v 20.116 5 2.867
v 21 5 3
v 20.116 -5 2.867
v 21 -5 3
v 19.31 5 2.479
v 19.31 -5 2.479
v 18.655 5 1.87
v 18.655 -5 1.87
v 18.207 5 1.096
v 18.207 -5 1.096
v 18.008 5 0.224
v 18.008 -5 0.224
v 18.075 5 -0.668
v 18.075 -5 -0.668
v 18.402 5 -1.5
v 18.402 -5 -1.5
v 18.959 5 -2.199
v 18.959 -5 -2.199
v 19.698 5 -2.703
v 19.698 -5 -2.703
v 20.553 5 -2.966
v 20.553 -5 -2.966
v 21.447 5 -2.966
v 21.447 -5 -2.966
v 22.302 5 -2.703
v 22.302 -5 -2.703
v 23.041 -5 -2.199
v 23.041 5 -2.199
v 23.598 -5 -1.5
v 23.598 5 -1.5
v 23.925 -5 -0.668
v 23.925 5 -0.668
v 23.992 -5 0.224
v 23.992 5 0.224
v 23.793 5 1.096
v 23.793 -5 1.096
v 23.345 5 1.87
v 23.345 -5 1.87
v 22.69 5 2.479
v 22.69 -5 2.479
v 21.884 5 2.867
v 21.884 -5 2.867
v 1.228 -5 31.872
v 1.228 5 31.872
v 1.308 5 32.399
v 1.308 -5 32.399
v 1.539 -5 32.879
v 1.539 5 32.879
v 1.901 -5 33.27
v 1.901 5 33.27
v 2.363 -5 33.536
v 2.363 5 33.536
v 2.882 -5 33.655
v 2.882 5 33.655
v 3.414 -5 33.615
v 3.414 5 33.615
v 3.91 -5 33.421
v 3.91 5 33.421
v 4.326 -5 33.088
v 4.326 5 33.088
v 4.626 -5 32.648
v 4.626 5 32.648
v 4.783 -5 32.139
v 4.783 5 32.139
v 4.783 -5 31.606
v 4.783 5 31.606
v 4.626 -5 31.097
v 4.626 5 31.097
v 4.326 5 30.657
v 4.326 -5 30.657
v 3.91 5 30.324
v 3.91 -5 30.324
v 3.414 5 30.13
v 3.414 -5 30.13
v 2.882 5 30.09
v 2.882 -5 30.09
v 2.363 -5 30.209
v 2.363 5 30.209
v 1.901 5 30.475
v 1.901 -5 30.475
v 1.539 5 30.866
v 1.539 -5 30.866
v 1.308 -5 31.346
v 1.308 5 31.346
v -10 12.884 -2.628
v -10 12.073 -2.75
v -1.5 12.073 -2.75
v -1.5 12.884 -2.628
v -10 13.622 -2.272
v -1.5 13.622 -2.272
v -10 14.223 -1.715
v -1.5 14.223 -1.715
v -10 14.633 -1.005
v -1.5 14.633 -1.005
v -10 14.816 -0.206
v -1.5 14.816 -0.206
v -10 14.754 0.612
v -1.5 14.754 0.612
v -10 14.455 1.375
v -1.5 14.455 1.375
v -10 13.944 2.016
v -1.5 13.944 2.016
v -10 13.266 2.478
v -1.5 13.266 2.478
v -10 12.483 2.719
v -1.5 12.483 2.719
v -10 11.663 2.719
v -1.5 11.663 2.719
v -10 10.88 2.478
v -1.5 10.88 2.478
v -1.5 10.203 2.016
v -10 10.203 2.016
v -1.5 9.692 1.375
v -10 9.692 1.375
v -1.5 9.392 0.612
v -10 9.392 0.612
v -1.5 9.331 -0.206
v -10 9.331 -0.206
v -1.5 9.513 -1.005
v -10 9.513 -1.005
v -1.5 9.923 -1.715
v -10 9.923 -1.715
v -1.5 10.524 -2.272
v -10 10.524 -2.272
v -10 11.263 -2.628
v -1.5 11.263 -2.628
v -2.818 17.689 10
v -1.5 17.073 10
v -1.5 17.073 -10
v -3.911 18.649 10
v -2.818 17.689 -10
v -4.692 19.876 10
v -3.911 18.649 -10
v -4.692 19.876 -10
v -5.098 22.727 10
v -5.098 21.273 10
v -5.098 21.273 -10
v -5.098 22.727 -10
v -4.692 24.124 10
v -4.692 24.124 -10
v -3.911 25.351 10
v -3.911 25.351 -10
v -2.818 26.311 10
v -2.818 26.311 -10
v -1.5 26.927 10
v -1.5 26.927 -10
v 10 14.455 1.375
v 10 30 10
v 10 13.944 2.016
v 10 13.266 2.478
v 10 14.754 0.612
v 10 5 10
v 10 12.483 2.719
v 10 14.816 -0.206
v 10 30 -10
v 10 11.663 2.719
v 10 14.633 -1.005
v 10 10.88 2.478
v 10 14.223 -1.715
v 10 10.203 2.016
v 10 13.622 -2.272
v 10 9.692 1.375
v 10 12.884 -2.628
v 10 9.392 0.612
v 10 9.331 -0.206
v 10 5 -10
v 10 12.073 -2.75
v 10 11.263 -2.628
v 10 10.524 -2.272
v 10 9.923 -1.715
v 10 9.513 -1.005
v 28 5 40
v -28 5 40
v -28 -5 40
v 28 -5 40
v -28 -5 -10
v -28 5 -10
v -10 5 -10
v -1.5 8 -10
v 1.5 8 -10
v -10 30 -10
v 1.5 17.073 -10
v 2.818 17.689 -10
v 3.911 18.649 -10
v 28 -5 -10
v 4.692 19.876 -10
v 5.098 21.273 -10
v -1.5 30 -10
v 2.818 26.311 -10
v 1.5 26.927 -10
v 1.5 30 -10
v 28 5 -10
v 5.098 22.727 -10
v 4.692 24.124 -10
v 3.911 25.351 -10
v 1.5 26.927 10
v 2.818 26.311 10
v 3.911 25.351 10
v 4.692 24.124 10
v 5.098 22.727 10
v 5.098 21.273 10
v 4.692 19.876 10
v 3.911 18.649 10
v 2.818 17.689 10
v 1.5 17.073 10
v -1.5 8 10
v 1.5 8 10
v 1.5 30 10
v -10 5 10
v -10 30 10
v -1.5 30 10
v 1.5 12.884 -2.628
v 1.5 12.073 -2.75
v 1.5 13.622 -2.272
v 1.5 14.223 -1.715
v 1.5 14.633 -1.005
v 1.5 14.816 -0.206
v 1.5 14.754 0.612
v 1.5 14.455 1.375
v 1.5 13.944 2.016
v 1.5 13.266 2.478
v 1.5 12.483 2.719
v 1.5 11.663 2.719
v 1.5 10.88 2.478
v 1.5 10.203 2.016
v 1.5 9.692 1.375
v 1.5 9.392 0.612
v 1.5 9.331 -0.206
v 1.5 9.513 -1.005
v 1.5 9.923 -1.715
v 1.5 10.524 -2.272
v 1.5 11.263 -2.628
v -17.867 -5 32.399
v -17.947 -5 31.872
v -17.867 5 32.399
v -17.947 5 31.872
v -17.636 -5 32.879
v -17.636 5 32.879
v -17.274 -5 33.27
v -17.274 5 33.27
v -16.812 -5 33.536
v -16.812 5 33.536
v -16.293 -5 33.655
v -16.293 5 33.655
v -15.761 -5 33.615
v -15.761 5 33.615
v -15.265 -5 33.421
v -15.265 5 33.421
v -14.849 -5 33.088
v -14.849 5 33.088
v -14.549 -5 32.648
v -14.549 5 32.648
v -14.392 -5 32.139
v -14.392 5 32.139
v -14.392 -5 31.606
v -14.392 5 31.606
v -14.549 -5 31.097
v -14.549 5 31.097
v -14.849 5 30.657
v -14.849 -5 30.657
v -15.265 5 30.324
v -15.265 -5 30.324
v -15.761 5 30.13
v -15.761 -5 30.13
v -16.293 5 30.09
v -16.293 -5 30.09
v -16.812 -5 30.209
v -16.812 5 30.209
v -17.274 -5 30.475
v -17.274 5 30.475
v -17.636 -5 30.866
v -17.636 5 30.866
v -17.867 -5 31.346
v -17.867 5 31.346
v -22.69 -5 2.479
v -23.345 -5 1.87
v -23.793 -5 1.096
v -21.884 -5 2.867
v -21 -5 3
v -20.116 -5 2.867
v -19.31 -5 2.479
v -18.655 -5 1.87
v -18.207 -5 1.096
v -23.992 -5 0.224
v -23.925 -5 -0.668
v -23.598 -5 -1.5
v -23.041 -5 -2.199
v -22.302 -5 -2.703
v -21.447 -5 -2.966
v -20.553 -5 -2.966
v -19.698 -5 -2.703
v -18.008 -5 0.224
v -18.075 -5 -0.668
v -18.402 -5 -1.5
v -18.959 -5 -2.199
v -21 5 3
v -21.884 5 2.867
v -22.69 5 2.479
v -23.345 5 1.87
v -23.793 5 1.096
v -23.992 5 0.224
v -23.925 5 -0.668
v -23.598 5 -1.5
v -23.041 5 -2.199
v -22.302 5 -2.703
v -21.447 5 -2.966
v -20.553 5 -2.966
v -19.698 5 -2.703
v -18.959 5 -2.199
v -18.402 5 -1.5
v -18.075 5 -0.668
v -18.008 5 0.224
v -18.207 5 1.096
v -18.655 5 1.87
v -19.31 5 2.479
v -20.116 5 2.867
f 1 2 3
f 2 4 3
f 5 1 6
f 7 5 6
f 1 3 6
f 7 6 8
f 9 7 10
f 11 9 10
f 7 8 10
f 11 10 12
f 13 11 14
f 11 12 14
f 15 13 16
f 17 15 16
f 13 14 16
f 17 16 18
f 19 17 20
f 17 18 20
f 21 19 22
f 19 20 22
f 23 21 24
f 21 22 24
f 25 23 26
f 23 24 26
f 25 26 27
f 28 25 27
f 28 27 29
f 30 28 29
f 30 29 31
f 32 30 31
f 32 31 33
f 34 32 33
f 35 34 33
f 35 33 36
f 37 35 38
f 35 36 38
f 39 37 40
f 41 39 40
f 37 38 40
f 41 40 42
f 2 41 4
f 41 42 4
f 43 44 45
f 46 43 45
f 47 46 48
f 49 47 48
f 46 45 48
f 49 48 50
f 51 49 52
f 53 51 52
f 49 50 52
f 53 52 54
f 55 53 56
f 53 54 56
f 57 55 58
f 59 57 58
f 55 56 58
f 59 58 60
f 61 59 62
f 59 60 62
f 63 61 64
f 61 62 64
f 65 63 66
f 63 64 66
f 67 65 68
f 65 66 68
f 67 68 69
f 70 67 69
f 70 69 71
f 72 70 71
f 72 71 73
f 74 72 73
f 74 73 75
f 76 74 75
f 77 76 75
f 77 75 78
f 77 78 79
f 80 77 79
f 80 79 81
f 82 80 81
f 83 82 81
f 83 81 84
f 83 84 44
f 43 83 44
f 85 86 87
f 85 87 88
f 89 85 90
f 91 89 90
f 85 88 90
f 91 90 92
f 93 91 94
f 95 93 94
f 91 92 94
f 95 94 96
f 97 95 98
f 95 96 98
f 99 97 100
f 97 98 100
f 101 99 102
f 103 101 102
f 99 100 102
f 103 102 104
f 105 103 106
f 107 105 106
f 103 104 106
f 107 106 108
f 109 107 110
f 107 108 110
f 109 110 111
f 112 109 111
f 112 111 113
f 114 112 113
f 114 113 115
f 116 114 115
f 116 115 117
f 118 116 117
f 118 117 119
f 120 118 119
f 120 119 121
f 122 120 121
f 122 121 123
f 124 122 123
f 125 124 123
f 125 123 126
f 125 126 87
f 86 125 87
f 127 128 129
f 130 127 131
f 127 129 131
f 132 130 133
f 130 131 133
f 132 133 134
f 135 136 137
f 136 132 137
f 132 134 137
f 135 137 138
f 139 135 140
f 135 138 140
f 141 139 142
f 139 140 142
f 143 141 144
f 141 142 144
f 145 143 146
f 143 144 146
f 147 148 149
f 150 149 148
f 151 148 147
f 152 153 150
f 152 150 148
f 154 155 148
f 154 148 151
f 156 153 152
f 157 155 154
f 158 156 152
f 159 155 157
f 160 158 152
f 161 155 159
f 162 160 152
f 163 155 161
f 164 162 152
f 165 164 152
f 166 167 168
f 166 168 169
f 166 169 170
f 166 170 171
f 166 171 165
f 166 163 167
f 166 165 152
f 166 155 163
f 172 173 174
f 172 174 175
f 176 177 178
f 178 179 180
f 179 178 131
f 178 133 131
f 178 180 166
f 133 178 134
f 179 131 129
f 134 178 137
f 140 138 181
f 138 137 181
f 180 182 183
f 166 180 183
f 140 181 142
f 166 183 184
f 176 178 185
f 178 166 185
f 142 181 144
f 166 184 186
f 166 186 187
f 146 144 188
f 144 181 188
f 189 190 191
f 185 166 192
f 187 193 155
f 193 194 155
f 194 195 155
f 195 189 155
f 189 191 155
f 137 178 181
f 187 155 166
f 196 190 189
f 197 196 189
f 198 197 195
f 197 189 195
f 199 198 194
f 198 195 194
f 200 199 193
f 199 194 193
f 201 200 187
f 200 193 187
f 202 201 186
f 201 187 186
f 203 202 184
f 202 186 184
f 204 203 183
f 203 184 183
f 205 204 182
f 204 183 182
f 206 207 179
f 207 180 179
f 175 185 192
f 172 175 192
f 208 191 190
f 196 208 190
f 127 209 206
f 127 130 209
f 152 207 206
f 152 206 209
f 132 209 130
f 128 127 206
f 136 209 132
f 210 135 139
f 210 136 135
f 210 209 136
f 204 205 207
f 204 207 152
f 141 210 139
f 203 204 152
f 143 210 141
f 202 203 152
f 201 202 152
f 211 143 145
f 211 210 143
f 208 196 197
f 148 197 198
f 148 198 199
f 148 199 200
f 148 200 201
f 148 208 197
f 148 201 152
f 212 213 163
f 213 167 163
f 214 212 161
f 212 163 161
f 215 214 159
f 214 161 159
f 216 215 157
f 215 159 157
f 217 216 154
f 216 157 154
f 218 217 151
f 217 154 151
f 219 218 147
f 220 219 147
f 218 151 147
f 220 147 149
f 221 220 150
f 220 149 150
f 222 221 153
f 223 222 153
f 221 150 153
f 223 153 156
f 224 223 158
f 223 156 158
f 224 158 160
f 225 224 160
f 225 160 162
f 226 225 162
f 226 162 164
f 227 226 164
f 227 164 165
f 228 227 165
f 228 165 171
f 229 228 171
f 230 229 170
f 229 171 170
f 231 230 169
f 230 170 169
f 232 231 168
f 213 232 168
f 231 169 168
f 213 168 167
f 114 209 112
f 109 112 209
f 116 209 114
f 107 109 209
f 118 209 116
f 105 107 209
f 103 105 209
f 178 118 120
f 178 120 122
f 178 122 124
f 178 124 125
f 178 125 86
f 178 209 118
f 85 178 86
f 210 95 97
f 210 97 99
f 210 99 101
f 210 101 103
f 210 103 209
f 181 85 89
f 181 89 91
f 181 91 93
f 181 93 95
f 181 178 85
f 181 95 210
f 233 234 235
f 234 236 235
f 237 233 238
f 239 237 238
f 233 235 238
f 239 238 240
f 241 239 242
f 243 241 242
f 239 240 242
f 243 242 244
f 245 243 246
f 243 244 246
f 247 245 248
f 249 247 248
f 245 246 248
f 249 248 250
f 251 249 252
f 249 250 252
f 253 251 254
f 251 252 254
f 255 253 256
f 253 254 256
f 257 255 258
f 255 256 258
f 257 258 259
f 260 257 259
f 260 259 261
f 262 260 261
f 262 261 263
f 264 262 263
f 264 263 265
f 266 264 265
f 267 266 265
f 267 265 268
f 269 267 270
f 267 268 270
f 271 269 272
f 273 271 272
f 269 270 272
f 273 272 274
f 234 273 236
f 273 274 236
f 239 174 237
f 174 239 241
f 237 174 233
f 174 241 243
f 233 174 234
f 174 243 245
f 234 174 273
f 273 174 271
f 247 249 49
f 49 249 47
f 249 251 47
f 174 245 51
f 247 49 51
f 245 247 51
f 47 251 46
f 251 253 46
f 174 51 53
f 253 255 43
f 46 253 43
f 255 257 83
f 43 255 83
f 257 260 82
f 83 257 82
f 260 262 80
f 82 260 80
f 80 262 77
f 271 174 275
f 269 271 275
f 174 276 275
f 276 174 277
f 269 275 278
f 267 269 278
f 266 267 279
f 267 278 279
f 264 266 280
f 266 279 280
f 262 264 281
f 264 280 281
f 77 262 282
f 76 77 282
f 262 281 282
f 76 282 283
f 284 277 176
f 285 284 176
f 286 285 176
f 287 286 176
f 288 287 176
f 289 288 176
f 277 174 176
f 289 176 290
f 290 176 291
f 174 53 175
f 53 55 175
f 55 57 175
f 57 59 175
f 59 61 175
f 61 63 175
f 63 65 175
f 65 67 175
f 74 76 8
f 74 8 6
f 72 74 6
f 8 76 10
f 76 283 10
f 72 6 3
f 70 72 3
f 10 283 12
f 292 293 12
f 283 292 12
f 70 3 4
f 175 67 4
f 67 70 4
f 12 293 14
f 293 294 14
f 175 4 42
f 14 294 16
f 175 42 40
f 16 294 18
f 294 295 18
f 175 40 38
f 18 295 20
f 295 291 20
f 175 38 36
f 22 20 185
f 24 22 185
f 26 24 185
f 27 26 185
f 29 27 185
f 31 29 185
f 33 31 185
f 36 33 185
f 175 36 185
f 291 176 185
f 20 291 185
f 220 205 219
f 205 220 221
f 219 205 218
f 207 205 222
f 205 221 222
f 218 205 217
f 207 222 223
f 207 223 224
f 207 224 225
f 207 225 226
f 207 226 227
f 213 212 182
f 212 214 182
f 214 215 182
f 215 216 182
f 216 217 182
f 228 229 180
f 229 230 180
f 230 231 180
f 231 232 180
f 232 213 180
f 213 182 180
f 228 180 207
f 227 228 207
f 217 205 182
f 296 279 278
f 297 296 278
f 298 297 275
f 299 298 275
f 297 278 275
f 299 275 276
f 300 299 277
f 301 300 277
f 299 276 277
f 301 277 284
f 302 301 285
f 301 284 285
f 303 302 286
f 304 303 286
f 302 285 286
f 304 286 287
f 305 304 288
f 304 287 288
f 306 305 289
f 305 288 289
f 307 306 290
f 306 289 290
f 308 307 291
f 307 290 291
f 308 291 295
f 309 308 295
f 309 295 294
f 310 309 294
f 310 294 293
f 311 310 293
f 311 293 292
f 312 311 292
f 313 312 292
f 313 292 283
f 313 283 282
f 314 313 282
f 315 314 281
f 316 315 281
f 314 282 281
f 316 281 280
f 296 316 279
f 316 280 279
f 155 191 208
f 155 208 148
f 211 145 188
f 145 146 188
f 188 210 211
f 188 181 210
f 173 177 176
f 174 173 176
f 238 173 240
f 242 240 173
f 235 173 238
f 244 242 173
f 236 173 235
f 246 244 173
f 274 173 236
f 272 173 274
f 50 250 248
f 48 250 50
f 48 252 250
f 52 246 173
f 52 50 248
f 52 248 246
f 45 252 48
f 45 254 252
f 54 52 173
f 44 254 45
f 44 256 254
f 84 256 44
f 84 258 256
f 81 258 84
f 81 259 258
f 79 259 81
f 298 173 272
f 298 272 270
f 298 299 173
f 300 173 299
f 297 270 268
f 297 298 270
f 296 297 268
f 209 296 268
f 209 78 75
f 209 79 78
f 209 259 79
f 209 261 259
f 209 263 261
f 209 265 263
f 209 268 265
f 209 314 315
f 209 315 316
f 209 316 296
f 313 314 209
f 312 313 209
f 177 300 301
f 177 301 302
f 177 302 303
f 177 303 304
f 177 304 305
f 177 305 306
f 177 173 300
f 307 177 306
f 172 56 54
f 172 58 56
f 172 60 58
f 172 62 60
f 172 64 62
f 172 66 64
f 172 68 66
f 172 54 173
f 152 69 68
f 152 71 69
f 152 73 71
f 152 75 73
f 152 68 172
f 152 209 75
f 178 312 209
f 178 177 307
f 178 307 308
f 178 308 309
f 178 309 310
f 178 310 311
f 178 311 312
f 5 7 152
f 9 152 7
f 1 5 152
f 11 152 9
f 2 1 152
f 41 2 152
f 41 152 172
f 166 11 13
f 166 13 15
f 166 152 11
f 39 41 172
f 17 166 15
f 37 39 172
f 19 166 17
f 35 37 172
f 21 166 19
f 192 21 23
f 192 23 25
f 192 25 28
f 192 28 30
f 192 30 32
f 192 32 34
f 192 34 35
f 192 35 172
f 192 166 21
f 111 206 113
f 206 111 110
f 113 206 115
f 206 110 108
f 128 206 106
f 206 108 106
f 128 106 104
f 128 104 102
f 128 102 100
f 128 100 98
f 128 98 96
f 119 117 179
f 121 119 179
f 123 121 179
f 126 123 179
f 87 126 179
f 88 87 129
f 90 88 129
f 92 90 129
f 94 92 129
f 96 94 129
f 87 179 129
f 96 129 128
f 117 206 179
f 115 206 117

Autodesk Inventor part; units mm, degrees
ref_plane "YZ Plane" through (0, 0, 0) normal (1, 0, 0) x (0, 1, 0)
ref_plane "XZ Plane" through (0, 0, 0) normal (0, 1, 0) x (-1, 0, 0)
ref_plane "XY Plane" through (0, 0, 0) normal (0, 0, 1) x (1, 0, 0)
sketch "Sketch1" plane through (0, 0, 0) normal (0, 0, 1) x (1, 0, 0)
  line L0 (-28, 5) -> (28, 5)
  line L1 (28, 5) -> (28, -5)
  line L2 (28, -5) -> (-28, -5)
  line L3 (-28, -5) -> (-28, 5)
  line L4 (-10, 30) -> (10, 30)
  line L5 (10, 30) -> (10, 5)
  line L6 (10, 5) -> (-10, 5)
  line L7 (-10, 5) -> (-10, 30)
  circle A0 centre (0, 22) radius 5.15
  line L8 (-1.5, 30) -> (1.5, 30)
  line L9 (1.5, 30) -> (1.5, 8)
  line L10 (1.5, 8) -> (-1.5, 8)
  line L11 (-1.5, 8) -> (-1.5, 30)
  point P0 (0, 0)
  point P1 (-28, 0)
  point P2 (0, 5)
  point P3 (0, 30)
  point P4 (0, 30)
  point P5 (-1.5, 17.0733)
  point P6 (-1.5, 26.9267)
  point P7 (-1.5, 30)
  point P8 (-10, 5)
  point P9 (10, 5)
  point P10 (1.5, 30)
  point P11 (1.5, 26.9267)
  point P12 (1.5, 17.0733)
  dimension "d0" = 10
  dimension "d1" = 20
  dimension "d2" = 10.3
  dimension "d3" = 17
  dimension "d4" = 8
  dimension "d5" = 3
  dimension "d6" = 14
  dimension "d7" = 18
extrude "Extrusion1" add sketch "Sketch1" along normal mid plane 20 contours L0 L1 L2 L3 | L7 L4 L11 A0 L10 L9 L5 L0
sketch "Sketch2" plane through (10, 5, 10) normal (0, 1, 0) x (1, 0, 0)
  line L0 (0, 20) -> (18, 20) projected
  line L1 (-38, 20) -> (-20, 20) projected
  line L2 (-38, 20) -> (-38, 0) projected
  line L3 (18, 20) -> (18, 0) projected
  point P0 (-10, 10)
  point P1 (-31, 10)
  point P2 (11, 10)
  point P3 (9, 20)
  point P4 (-38, 10)
  point P5 (18, 10)
  dimension "d29" = 7
  dimension "d30" = 7
hole "Hole1" at (-21, 5, 0) at (21, 5, 0) direction (0, -1, 0) diameter 6 end through all
sketch "Sketch4" plane through (0, 0, 10) normal (0, 0, 1) x (1, 0, 0)
  line L0 (-10, 5) -> (-28, 5) projected
  line L1 (-28, 5) -> (-28, -5) projected
  line L2 (-28, -5) -> (28, -5) projected
  line L3 (28, -5) -> (28, 5) projected
  line L4 (28, 5) -> (10, 5) projected
  line L5 (10, 5) -> (10, 30) projected
  line L6 (10, 30) -> (1.5, 30) projected
  line L7 (1.5, 30) -> (1.5, 26.9267) projected
  arc A0 (1.5, 17.0733) -> (1.5, 26.9267) centre (0, 22) ccw projected
  line L8 (1.5, 17.0733) -> (1.5, 8) projected
  line L9 (1.5, 8) -> (-1.5, 8) projected
  line L10 (-1.5, 8) -> (-1.5, 17.0733) projected
  arc A1 (-1.5, 26.9267) -> (-1.5, 17.0733) centre (0, 22) ccw projected
  line L11 (-1.5, 26.9267) -> (-1.5, 30) projected
  line L12 (-1.5, 30) -> (-10, 30) projected
  line L13 (-10, 30) -> (-10, 5) projected
  line L14 (-10, 5) -> (-28, 5) projected
  line L15 (28, 5) -> (10, 5) projected
  line L16 (-10, 5) -> (10, 5)
  point P0 (0, 0)
extrude "Extrusion3" add sketch "Sketch4" along normal blind 30 contours L16 L4 L3 L2 L1 L0
sketch "Sketch3" plane through (10, 5, 10) normal (1, 0, 0) x (0, 0, -1)
  line L0 (20, 25) -> (0, 25) projected
  circle A0 centre (10, 7.0733) radius 2.75
  line L1 (20, 25) -> (0, 25) projected
  line L2 (0, 25) -> (8, 25)
  line L3 (8, 25) -> (8, 0)
  line L4 (8, 0) -> (0, 0)
  line L5 (0, 0) -> (0, 25)
  line L6 (20, 0) -> (0, 0) projected
  line L7 (12, 25) -> (20, 25)
  line L8 (20, 25) -> (20, 0)
  line L9 (20, 0) -> (12, 0)
  line L10 (12, 0) -> (12, 25)
  line L11 (20, 25) -> (20, 0) projected
  line L12 (20, 12.0733) -> (0, 12.0733) projected
  point P0 (10, -5)
  point P1 (10, 25)
  point P2 (12, 0)
  dimension "d18" = 5.5
  dimension "d19" = 8
  dimension "d21" = 8
  dimension "d31" = 5
extrude "Extrusion2" cut sketch "Sketch3" against normal through all contours L10 A0 L3 | A0 L10 | L3 A0
sketch "Sketch5" plane through (-10, 5, 10) normal (0, 1, 0) x (-1, 0, 0)
  circle A0 centre (6.1591, 21.8725) radius 1.7875 projected
  circle A1 centre (-13.0159, 21.8725) radius 1.7875 projected
  point P0 (-10, -10)
extrude "Extrusion4" cut sketch "Sketch5" against normal blind 10
equation "\"d30\" = d29"
equation "\"d21\" = d19"
properties part number "0008-10-052 Suport Axa Y +Senzor"
